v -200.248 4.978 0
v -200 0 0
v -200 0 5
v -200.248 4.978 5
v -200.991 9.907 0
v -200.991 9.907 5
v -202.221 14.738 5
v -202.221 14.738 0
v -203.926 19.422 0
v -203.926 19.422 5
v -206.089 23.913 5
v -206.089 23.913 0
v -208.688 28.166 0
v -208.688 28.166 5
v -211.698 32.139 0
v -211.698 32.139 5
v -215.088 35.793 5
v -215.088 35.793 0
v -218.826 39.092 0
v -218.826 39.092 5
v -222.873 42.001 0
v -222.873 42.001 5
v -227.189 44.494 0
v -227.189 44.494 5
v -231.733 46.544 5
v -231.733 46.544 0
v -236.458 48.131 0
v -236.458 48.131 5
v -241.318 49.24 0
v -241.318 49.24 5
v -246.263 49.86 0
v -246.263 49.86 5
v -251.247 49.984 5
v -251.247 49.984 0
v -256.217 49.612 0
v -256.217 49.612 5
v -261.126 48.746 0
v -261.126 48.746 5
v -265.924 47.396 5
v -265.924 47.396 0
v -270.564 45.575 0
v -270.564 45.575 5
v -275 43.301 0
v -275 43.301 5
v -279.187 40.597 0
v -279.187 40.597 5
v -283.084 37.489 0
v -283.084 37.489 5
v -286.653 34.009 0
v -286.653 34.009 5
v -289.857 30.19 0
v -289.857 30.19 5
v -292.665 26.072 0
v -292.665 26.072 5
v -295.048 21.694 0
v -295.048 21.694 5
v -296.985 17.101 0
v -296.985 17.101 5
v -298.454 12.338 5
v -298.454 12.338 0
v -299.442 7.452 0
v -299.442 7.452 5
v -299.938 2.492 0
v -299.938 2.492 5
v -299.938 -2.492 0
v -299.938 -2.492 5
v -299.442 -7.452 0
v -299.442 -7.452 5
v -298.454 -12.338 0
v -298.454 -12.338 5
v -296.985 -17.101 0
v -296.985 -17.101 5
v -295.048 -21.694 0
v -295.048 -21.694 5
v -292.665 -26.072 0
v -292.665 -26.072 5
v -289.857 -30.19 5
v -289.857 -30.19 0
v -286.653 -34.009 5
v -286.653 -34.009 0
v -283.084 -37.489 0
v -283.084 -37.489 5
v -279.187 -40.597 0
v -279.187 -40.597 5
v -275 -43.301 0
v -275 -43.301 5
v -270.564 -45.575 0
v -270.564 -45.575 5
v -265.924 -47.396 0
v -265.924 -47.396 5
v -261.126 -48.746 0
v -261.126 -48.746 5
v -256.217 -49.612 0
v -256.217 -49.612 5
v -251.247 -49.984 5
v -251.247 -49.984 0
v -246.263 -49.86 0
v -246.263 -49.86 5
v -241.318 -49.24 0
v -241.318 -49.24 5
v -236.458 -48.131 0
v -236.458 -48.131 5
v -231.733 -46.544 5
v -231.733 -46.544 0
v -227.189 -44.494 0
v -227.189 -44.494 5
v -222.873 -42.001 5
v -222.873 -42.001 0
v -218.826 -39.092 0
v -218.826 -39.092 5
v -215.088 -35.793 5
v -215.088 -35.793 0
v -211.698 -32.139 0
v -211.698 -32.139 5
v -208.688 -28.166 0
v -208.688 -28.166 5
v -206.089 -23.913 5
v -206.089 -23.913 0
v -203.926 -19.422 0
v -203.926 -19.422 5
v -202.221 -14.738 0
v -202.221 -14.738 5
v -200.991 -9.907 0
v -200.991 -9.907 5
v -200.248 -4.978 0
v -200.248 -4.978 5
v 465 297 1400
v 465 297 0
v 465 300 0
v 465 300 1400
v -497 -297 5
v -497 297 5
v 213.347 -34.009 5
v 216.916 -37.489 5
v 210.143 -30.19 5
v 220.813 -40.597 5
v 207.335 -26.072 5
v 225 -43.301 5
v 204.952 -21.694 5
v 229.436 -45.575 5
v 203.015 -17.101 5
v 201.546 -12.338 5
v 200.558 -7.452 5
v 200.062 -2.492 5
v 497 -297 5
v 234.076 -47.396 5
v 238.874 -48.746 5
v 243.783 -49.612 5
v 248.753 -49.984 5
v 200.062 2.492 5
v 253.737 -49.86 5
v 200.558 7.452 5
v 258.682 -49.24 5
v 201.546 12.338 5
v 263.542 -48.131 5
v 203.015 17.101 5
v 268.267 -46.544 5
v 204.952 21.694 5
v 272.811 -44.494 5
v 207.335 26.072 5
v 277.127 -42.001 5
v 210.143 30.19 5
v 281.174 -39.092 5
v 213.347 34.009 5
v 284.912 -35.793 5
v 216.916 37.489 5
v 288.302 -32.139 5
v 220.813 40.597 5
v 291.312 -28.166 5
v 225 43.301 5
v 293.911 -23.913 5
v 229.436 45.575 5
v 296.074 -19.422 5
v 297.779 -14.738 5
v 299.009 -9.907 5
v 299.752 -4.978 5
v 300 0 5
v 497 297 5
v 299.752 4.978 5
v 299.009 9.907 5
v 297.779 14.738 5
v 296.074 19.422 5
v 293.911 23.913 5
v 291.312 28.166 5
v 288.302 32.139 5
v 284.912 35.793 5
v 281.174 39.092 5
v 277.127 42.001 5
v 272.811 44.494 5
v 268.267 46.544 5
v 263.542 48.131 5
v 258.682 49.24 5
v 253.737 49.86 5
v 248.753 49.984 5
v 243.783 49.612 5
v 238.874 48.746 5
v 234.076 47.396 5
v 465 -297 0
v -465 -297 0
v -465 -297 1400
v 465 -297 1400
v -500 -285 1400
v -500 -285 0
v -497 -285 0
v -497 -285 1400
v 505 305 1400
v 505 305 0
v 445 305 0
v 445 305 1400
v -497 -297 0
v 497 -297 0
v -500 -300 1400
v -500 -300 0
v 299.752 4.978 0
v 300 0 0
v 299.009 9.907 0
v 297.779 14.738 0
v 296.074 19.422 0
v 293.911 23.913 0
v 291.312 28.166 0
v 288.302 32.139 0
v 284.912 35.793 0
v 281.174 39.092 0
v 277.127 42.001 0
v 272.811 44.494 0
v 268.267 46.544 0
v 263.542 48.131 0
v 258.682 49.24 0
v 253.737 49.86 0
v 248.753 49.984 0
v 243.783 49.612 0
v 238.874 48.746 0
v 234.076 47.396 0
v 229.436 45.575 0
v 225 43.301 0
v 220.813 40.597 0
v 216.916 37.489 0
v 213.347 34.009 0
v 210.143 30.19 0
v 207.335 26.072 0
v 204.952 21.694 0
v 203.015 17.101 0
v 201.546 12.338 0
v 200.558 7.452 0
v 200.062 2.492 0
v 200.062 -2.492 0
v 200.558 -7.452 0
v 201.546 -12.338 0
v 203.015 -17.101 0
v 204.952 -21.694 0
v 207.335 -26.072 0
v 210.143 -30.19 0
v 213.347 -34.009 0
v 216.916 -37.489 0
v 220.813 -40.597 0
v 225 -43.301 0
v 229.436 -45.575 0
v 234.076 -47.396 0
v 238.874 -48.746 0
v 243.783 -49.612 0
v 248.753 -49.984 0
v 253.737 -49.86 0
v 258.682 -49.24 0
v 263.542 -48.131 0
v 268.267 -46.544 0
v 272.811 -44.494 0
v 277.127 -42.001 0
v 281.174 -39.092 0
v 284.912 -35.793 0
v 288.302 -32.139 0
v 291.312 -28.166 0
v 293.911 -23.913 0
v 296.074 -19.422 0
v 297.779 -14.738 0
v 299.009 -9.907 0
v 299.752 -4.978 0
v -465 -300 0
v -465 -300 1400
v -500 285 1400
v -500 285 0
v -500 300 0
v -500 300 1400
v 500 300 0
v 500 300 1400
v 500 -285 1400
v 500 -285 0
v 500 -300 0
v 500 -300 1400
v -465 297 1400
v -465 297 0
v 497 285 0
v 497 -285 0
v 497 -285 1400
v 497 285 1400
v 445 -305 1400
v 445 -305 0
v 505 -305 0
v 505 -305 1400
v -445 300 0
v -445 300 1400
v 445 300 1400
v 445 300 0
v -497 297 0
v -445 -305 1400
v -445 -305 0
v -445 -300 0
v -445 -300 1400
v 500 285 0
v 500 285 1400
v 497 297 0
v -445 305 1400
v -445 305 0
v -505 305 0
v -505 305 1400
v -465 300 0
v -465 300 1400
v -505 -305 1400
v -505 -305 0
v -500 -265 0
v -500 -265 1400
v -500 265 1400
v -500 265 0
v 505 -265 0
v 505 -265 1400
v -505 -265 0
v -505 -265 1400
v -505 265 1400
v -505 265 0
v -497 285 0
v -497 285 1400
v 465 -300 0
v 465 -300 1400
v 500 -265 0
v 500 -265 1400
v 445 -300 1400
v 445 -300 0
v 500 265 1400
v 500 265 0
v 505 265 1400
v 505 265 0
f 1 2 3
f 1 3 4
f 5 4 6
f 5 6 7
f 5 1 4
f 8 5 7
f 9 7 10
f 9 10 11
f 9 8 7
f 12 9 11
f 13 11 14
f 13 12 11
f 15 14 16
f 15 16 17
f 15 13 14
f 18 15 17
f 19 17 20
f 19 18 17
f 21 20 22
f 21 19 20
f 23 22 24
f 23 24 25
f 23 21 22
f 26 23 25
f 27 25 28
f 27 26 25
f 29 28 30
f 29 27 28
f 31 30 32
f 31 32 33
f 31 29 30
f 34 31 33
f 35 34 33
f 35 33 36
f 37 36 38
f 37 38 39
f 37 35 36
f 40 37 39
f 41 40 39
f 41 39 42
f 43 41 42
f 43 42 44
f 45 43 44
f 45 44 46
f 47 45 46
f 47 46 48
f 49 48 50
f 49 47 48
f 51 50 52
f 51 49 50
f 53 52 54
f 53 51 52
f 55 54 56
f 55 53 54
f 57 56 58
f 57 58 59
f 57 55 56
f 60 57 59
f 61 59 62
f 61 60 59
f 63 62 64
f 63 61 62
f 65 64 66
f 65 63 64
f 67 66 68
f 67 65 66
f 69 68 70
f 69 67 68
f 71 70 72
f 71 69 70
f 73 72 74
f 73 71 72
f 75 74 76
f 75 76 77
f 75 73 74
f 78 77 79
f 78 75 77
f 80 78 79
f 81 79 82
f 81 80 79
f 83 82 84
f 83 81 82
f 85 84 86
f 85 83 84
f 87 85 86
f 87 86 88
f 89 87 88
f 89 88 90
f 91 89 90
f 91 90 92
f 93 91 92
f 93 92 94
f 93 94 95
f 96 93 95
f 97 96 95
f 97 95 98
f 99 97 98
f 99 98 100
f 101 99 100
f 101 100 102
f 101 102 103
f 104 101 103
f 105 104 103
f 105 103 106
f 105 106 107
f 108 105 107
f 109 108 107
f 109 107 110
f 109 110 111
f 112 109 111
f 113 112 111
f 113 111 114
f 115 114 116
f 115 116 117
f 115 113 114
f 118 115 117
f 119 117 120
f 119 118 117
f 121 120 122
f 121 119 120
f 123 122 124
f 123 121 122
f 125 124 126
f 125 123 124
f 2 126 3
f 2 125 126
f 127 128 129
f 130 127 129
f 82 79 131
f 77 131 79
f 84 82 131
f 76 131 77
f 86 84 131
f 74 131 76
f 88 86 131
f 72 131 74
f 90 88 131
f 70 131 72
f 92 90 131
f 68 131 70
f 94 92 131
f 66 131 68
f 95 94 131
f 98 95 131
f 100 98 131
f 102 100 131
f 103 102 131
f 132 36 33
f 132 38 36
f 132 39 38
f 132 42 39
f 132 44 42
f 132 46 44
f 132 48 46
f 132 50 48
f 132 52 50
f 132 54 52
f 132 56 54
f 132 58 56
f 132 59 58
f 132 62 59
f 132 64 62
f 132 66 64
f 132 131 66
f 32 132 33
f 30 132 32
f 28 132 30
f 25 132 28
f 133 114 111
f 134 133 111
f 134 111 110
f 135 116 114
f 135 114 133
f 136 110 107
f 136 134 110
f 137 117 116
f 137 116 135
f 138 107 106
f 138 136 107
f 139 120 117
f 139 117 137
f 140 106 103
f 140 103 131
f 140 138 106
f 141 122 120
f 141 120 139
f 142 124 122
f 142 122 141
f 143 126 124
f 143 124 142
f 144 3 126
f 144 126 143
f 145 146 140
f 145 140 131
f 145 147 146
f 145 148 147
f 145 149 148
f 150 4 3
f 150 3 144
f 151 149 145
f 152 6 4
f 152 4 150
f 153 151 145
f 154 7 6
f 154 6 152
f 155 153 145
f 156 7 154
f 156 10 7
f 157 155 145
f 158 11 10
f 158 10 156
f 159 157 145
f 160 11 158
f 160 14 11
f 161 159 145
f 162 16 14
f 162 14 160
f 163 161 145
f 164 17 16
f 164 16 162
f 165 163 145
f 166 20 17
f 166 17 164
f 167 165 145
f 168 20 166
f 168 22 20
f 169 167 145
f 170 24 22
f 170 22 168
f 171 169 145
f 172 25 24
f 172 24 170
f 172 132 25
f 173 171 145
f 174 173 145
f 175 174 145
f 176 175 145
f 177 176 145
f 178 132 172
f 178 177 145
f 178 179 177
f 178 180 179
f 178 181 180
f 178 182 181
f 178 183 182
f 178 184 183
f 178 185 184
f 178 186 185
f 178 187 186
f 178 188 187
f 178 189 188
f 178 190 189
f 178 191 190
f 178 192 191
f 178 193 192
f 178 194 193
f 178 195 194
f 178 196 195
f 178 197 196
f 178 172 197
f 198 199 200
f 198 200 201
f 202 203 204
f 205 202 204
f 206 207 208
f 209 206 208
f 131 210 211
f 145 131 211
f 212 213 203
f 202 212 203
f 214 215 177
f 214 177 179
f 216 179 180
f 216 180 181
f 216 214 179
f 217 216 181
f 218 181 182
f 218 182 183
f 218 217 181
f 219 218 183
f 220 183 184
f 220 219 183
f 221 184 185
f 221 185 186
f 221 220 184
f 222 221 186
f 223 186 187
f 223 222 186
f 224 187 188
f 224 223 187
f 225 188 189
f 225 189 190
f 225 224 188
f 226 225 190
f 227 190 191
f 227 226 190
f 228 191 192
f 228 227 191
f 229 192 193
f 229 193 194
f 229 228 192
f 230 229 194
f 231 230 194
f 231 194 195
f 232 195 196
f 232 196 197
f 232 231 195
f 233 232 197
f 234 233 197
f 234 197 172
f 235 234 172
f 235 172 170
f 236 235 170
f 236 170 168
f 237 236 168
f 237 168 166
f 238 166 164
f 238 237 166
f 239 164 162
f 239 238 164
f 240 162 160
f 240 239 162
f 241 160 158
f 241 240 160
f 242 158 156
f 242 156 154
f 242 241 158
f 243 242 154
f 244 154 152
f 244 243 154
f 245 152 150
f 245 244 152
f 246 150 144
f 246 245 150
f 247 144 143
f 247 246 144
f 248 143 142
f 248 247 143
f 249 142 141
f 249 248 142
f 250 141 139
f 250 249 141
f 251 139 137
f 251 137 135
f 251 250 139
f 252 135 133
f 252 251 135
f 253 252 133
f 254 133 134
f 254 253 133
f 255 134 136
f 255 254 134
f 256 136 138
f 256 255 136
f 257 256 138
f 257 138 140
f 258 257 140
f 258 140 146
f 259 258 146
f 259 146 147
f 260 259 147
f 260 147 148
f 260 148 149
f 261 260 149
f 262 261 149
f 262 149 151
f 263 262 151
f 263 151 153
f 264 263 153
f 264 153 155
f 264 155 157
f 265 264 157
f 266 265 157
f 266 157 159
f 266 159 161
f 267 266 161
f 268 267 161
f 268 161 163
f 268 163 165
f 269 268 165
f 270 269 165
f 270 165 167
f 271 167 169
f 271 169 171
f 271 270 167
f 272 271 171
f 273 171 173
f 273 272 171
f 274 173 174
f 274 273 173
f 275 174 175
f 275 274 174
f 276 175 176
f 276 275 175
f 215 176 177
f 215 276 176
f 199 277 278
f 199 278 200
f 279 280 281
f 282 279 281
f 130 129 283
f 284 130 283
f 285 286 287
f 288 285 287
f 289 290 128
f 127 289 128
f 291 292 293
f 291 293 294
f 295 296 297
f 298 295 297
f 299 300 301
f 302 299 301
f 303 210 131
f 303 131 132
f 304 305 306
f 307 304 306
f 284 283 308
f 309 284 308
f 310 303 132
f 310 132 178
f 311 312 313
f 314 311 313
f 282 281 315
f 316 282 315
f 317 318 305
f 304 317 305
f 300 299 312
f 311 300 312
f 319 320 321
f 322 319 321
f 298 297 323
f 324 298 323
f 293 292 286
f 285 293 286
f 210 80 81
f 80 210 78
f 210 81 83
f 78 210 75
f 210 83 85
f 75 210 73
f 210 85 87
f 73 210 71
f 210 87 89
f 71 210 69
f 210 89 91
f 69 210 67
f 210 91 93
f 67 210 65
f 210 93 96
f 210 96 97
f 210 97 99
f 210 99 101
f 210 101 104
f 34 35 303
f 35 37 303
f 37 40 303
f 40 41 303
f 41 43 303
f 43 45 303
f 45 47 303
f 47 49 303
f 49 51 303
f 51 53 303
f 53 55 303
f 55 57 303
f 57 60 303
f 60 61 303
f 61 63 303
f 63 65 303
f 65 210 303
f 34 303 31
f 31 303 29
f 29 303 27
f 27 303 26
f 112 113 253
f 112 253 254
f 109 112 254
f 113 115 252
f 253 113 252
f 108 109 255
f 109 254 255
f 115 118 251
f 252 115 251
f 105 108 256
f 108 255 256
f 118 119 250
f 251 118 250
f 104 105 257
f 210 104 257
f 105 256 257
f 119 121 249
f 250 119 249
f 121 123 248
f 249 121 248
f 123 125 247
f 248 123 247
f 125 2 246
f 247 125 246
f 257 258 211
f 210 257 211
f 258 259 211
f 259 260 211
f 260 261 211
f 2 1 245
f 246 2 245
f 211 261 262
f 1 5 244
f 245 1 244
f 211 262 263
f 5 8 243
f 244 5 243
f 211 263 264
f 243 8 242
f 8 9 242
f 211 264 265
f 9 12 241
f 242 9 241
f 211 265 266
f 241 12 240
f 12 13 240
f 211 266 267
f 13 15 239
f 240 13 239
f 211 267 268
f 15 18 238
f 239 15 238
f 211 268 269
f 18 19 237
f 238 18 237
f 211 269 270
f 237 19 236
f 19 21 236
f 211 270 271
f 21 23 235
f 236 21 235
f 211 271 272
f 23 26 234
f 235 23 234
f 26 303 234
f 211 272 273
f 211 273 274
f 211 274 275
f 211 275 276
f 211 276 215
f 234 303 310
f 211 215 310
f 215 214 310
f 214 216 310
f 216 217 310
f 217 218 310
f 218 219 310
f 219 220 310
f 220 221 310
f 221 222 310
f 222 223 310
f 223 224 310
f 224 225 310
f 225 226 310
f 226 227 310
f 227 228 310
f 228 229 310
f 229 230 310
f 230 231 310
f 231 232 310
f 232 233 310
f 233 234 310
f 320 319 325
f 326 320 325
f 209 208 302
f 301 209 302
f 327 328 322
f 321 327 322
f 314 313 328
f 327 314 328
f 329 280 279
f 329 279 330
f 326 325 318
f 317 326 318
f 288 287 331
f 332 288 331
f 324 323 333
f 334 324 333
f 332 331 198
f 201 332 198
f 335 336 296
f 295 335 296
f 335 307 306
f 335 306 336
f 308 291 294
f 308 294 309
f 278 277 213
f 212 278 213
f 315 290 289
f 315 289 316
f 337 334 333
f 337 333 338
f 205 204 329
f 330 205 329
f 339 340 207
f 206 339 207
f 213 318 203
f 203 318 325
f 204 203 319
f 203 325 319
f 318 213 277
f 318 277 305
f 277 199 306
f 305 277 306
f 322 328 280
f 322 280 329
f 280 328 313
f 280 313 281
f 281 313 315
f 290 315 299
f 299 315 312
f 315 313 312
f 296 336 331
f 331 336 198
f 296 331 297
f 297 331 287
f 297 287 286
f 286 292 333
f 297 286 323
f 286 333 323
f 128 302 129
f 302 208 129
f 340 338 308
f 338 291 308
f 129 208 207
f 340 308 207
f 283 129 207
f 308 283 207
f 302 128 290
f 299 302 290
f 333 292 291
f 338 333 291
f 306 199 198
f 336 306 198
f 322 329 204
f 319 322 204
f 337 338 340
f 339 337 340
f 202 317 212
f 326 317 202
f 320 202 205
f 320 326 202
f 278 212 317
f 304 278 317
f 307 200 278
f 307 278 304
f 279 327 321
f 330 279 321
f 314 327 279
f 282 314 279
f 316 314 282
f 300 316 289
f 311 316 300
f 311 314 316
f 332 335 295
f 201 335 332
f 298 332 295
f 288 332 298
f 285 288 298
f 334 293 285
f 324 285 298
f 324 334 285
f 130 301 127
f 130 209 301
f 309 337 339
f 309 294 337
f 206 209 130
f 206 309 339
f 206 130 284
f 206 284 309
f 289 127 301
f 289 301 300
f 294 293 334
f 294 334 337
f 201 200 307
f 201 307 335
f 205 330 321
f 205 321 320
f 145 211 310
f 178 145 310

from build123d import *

# Parameters (mm, degrees)
F2_DEPTH = 1400
F3_W     = 930
F3_H     = 3
F3_W_2   = 3
F3_H_2   = 570
F4_DEPTH = 1400
F5_W     = 994
F5_H     = 594
F5_R     = 50
F6_DEPTH = 5


with BuildPart() as f2:
    # F1 (on Top) → F2 (new body, through all)
    with BuildSketch(Plane.XY):
        Polygon((-505, 305), (-505, 265), (-500, 265), (-500, 300), (-445, 300), (-445, 305), align=None)
        Polygon((505, 305), (445, 305), (445, 300), (500, 300), (500, 265), (505, 265), align=None)
        Polygon((445, -300), (445, -305), (505, -305), (505, -265), (500, -265), (500, -300), align=None)
        Polygon((-500, -265), (-505, -265), (-505, -305), (-445, -305), (-445, -300), (-500, -300), align=None)
    extrude(amount=F2_DEPTH)

    # F3 (on offset) → F4 (join, through all)
    with BuildSketch(Plane.XY.offset(1400)):
        with Locations((0, 298.5)):
            Rectangle(F3_W, F3_H)
        with Locations((498.5, 0)):
            Rectangle(F3_W_2, F3_H_2)
        with Locations((0, -298.5)):
            Rectangle(F3_W, F3_H)
        with Locations((-498.5, 0)):
            Rectangle(F3_W_2, F3_H_2)
    extrude(amount=-F4_DEPTH)


with BuildPart() as f6:
    # F5 (on Top) → F6 (new body)
    with BuildSketch(Plane.XY):
        Rectangle(F5_W, F5_H)
        with Locations((-250, 0)):
            Circle(F5_R, mode=Mode.SUBTRACT)
        with Locations((250, 0)):
            Circle(F5_R, mode=Mode.SUBTRACT)
    extrude(amount=F6_DEPTH)


solid = Compound([f2.part, f6.part])
